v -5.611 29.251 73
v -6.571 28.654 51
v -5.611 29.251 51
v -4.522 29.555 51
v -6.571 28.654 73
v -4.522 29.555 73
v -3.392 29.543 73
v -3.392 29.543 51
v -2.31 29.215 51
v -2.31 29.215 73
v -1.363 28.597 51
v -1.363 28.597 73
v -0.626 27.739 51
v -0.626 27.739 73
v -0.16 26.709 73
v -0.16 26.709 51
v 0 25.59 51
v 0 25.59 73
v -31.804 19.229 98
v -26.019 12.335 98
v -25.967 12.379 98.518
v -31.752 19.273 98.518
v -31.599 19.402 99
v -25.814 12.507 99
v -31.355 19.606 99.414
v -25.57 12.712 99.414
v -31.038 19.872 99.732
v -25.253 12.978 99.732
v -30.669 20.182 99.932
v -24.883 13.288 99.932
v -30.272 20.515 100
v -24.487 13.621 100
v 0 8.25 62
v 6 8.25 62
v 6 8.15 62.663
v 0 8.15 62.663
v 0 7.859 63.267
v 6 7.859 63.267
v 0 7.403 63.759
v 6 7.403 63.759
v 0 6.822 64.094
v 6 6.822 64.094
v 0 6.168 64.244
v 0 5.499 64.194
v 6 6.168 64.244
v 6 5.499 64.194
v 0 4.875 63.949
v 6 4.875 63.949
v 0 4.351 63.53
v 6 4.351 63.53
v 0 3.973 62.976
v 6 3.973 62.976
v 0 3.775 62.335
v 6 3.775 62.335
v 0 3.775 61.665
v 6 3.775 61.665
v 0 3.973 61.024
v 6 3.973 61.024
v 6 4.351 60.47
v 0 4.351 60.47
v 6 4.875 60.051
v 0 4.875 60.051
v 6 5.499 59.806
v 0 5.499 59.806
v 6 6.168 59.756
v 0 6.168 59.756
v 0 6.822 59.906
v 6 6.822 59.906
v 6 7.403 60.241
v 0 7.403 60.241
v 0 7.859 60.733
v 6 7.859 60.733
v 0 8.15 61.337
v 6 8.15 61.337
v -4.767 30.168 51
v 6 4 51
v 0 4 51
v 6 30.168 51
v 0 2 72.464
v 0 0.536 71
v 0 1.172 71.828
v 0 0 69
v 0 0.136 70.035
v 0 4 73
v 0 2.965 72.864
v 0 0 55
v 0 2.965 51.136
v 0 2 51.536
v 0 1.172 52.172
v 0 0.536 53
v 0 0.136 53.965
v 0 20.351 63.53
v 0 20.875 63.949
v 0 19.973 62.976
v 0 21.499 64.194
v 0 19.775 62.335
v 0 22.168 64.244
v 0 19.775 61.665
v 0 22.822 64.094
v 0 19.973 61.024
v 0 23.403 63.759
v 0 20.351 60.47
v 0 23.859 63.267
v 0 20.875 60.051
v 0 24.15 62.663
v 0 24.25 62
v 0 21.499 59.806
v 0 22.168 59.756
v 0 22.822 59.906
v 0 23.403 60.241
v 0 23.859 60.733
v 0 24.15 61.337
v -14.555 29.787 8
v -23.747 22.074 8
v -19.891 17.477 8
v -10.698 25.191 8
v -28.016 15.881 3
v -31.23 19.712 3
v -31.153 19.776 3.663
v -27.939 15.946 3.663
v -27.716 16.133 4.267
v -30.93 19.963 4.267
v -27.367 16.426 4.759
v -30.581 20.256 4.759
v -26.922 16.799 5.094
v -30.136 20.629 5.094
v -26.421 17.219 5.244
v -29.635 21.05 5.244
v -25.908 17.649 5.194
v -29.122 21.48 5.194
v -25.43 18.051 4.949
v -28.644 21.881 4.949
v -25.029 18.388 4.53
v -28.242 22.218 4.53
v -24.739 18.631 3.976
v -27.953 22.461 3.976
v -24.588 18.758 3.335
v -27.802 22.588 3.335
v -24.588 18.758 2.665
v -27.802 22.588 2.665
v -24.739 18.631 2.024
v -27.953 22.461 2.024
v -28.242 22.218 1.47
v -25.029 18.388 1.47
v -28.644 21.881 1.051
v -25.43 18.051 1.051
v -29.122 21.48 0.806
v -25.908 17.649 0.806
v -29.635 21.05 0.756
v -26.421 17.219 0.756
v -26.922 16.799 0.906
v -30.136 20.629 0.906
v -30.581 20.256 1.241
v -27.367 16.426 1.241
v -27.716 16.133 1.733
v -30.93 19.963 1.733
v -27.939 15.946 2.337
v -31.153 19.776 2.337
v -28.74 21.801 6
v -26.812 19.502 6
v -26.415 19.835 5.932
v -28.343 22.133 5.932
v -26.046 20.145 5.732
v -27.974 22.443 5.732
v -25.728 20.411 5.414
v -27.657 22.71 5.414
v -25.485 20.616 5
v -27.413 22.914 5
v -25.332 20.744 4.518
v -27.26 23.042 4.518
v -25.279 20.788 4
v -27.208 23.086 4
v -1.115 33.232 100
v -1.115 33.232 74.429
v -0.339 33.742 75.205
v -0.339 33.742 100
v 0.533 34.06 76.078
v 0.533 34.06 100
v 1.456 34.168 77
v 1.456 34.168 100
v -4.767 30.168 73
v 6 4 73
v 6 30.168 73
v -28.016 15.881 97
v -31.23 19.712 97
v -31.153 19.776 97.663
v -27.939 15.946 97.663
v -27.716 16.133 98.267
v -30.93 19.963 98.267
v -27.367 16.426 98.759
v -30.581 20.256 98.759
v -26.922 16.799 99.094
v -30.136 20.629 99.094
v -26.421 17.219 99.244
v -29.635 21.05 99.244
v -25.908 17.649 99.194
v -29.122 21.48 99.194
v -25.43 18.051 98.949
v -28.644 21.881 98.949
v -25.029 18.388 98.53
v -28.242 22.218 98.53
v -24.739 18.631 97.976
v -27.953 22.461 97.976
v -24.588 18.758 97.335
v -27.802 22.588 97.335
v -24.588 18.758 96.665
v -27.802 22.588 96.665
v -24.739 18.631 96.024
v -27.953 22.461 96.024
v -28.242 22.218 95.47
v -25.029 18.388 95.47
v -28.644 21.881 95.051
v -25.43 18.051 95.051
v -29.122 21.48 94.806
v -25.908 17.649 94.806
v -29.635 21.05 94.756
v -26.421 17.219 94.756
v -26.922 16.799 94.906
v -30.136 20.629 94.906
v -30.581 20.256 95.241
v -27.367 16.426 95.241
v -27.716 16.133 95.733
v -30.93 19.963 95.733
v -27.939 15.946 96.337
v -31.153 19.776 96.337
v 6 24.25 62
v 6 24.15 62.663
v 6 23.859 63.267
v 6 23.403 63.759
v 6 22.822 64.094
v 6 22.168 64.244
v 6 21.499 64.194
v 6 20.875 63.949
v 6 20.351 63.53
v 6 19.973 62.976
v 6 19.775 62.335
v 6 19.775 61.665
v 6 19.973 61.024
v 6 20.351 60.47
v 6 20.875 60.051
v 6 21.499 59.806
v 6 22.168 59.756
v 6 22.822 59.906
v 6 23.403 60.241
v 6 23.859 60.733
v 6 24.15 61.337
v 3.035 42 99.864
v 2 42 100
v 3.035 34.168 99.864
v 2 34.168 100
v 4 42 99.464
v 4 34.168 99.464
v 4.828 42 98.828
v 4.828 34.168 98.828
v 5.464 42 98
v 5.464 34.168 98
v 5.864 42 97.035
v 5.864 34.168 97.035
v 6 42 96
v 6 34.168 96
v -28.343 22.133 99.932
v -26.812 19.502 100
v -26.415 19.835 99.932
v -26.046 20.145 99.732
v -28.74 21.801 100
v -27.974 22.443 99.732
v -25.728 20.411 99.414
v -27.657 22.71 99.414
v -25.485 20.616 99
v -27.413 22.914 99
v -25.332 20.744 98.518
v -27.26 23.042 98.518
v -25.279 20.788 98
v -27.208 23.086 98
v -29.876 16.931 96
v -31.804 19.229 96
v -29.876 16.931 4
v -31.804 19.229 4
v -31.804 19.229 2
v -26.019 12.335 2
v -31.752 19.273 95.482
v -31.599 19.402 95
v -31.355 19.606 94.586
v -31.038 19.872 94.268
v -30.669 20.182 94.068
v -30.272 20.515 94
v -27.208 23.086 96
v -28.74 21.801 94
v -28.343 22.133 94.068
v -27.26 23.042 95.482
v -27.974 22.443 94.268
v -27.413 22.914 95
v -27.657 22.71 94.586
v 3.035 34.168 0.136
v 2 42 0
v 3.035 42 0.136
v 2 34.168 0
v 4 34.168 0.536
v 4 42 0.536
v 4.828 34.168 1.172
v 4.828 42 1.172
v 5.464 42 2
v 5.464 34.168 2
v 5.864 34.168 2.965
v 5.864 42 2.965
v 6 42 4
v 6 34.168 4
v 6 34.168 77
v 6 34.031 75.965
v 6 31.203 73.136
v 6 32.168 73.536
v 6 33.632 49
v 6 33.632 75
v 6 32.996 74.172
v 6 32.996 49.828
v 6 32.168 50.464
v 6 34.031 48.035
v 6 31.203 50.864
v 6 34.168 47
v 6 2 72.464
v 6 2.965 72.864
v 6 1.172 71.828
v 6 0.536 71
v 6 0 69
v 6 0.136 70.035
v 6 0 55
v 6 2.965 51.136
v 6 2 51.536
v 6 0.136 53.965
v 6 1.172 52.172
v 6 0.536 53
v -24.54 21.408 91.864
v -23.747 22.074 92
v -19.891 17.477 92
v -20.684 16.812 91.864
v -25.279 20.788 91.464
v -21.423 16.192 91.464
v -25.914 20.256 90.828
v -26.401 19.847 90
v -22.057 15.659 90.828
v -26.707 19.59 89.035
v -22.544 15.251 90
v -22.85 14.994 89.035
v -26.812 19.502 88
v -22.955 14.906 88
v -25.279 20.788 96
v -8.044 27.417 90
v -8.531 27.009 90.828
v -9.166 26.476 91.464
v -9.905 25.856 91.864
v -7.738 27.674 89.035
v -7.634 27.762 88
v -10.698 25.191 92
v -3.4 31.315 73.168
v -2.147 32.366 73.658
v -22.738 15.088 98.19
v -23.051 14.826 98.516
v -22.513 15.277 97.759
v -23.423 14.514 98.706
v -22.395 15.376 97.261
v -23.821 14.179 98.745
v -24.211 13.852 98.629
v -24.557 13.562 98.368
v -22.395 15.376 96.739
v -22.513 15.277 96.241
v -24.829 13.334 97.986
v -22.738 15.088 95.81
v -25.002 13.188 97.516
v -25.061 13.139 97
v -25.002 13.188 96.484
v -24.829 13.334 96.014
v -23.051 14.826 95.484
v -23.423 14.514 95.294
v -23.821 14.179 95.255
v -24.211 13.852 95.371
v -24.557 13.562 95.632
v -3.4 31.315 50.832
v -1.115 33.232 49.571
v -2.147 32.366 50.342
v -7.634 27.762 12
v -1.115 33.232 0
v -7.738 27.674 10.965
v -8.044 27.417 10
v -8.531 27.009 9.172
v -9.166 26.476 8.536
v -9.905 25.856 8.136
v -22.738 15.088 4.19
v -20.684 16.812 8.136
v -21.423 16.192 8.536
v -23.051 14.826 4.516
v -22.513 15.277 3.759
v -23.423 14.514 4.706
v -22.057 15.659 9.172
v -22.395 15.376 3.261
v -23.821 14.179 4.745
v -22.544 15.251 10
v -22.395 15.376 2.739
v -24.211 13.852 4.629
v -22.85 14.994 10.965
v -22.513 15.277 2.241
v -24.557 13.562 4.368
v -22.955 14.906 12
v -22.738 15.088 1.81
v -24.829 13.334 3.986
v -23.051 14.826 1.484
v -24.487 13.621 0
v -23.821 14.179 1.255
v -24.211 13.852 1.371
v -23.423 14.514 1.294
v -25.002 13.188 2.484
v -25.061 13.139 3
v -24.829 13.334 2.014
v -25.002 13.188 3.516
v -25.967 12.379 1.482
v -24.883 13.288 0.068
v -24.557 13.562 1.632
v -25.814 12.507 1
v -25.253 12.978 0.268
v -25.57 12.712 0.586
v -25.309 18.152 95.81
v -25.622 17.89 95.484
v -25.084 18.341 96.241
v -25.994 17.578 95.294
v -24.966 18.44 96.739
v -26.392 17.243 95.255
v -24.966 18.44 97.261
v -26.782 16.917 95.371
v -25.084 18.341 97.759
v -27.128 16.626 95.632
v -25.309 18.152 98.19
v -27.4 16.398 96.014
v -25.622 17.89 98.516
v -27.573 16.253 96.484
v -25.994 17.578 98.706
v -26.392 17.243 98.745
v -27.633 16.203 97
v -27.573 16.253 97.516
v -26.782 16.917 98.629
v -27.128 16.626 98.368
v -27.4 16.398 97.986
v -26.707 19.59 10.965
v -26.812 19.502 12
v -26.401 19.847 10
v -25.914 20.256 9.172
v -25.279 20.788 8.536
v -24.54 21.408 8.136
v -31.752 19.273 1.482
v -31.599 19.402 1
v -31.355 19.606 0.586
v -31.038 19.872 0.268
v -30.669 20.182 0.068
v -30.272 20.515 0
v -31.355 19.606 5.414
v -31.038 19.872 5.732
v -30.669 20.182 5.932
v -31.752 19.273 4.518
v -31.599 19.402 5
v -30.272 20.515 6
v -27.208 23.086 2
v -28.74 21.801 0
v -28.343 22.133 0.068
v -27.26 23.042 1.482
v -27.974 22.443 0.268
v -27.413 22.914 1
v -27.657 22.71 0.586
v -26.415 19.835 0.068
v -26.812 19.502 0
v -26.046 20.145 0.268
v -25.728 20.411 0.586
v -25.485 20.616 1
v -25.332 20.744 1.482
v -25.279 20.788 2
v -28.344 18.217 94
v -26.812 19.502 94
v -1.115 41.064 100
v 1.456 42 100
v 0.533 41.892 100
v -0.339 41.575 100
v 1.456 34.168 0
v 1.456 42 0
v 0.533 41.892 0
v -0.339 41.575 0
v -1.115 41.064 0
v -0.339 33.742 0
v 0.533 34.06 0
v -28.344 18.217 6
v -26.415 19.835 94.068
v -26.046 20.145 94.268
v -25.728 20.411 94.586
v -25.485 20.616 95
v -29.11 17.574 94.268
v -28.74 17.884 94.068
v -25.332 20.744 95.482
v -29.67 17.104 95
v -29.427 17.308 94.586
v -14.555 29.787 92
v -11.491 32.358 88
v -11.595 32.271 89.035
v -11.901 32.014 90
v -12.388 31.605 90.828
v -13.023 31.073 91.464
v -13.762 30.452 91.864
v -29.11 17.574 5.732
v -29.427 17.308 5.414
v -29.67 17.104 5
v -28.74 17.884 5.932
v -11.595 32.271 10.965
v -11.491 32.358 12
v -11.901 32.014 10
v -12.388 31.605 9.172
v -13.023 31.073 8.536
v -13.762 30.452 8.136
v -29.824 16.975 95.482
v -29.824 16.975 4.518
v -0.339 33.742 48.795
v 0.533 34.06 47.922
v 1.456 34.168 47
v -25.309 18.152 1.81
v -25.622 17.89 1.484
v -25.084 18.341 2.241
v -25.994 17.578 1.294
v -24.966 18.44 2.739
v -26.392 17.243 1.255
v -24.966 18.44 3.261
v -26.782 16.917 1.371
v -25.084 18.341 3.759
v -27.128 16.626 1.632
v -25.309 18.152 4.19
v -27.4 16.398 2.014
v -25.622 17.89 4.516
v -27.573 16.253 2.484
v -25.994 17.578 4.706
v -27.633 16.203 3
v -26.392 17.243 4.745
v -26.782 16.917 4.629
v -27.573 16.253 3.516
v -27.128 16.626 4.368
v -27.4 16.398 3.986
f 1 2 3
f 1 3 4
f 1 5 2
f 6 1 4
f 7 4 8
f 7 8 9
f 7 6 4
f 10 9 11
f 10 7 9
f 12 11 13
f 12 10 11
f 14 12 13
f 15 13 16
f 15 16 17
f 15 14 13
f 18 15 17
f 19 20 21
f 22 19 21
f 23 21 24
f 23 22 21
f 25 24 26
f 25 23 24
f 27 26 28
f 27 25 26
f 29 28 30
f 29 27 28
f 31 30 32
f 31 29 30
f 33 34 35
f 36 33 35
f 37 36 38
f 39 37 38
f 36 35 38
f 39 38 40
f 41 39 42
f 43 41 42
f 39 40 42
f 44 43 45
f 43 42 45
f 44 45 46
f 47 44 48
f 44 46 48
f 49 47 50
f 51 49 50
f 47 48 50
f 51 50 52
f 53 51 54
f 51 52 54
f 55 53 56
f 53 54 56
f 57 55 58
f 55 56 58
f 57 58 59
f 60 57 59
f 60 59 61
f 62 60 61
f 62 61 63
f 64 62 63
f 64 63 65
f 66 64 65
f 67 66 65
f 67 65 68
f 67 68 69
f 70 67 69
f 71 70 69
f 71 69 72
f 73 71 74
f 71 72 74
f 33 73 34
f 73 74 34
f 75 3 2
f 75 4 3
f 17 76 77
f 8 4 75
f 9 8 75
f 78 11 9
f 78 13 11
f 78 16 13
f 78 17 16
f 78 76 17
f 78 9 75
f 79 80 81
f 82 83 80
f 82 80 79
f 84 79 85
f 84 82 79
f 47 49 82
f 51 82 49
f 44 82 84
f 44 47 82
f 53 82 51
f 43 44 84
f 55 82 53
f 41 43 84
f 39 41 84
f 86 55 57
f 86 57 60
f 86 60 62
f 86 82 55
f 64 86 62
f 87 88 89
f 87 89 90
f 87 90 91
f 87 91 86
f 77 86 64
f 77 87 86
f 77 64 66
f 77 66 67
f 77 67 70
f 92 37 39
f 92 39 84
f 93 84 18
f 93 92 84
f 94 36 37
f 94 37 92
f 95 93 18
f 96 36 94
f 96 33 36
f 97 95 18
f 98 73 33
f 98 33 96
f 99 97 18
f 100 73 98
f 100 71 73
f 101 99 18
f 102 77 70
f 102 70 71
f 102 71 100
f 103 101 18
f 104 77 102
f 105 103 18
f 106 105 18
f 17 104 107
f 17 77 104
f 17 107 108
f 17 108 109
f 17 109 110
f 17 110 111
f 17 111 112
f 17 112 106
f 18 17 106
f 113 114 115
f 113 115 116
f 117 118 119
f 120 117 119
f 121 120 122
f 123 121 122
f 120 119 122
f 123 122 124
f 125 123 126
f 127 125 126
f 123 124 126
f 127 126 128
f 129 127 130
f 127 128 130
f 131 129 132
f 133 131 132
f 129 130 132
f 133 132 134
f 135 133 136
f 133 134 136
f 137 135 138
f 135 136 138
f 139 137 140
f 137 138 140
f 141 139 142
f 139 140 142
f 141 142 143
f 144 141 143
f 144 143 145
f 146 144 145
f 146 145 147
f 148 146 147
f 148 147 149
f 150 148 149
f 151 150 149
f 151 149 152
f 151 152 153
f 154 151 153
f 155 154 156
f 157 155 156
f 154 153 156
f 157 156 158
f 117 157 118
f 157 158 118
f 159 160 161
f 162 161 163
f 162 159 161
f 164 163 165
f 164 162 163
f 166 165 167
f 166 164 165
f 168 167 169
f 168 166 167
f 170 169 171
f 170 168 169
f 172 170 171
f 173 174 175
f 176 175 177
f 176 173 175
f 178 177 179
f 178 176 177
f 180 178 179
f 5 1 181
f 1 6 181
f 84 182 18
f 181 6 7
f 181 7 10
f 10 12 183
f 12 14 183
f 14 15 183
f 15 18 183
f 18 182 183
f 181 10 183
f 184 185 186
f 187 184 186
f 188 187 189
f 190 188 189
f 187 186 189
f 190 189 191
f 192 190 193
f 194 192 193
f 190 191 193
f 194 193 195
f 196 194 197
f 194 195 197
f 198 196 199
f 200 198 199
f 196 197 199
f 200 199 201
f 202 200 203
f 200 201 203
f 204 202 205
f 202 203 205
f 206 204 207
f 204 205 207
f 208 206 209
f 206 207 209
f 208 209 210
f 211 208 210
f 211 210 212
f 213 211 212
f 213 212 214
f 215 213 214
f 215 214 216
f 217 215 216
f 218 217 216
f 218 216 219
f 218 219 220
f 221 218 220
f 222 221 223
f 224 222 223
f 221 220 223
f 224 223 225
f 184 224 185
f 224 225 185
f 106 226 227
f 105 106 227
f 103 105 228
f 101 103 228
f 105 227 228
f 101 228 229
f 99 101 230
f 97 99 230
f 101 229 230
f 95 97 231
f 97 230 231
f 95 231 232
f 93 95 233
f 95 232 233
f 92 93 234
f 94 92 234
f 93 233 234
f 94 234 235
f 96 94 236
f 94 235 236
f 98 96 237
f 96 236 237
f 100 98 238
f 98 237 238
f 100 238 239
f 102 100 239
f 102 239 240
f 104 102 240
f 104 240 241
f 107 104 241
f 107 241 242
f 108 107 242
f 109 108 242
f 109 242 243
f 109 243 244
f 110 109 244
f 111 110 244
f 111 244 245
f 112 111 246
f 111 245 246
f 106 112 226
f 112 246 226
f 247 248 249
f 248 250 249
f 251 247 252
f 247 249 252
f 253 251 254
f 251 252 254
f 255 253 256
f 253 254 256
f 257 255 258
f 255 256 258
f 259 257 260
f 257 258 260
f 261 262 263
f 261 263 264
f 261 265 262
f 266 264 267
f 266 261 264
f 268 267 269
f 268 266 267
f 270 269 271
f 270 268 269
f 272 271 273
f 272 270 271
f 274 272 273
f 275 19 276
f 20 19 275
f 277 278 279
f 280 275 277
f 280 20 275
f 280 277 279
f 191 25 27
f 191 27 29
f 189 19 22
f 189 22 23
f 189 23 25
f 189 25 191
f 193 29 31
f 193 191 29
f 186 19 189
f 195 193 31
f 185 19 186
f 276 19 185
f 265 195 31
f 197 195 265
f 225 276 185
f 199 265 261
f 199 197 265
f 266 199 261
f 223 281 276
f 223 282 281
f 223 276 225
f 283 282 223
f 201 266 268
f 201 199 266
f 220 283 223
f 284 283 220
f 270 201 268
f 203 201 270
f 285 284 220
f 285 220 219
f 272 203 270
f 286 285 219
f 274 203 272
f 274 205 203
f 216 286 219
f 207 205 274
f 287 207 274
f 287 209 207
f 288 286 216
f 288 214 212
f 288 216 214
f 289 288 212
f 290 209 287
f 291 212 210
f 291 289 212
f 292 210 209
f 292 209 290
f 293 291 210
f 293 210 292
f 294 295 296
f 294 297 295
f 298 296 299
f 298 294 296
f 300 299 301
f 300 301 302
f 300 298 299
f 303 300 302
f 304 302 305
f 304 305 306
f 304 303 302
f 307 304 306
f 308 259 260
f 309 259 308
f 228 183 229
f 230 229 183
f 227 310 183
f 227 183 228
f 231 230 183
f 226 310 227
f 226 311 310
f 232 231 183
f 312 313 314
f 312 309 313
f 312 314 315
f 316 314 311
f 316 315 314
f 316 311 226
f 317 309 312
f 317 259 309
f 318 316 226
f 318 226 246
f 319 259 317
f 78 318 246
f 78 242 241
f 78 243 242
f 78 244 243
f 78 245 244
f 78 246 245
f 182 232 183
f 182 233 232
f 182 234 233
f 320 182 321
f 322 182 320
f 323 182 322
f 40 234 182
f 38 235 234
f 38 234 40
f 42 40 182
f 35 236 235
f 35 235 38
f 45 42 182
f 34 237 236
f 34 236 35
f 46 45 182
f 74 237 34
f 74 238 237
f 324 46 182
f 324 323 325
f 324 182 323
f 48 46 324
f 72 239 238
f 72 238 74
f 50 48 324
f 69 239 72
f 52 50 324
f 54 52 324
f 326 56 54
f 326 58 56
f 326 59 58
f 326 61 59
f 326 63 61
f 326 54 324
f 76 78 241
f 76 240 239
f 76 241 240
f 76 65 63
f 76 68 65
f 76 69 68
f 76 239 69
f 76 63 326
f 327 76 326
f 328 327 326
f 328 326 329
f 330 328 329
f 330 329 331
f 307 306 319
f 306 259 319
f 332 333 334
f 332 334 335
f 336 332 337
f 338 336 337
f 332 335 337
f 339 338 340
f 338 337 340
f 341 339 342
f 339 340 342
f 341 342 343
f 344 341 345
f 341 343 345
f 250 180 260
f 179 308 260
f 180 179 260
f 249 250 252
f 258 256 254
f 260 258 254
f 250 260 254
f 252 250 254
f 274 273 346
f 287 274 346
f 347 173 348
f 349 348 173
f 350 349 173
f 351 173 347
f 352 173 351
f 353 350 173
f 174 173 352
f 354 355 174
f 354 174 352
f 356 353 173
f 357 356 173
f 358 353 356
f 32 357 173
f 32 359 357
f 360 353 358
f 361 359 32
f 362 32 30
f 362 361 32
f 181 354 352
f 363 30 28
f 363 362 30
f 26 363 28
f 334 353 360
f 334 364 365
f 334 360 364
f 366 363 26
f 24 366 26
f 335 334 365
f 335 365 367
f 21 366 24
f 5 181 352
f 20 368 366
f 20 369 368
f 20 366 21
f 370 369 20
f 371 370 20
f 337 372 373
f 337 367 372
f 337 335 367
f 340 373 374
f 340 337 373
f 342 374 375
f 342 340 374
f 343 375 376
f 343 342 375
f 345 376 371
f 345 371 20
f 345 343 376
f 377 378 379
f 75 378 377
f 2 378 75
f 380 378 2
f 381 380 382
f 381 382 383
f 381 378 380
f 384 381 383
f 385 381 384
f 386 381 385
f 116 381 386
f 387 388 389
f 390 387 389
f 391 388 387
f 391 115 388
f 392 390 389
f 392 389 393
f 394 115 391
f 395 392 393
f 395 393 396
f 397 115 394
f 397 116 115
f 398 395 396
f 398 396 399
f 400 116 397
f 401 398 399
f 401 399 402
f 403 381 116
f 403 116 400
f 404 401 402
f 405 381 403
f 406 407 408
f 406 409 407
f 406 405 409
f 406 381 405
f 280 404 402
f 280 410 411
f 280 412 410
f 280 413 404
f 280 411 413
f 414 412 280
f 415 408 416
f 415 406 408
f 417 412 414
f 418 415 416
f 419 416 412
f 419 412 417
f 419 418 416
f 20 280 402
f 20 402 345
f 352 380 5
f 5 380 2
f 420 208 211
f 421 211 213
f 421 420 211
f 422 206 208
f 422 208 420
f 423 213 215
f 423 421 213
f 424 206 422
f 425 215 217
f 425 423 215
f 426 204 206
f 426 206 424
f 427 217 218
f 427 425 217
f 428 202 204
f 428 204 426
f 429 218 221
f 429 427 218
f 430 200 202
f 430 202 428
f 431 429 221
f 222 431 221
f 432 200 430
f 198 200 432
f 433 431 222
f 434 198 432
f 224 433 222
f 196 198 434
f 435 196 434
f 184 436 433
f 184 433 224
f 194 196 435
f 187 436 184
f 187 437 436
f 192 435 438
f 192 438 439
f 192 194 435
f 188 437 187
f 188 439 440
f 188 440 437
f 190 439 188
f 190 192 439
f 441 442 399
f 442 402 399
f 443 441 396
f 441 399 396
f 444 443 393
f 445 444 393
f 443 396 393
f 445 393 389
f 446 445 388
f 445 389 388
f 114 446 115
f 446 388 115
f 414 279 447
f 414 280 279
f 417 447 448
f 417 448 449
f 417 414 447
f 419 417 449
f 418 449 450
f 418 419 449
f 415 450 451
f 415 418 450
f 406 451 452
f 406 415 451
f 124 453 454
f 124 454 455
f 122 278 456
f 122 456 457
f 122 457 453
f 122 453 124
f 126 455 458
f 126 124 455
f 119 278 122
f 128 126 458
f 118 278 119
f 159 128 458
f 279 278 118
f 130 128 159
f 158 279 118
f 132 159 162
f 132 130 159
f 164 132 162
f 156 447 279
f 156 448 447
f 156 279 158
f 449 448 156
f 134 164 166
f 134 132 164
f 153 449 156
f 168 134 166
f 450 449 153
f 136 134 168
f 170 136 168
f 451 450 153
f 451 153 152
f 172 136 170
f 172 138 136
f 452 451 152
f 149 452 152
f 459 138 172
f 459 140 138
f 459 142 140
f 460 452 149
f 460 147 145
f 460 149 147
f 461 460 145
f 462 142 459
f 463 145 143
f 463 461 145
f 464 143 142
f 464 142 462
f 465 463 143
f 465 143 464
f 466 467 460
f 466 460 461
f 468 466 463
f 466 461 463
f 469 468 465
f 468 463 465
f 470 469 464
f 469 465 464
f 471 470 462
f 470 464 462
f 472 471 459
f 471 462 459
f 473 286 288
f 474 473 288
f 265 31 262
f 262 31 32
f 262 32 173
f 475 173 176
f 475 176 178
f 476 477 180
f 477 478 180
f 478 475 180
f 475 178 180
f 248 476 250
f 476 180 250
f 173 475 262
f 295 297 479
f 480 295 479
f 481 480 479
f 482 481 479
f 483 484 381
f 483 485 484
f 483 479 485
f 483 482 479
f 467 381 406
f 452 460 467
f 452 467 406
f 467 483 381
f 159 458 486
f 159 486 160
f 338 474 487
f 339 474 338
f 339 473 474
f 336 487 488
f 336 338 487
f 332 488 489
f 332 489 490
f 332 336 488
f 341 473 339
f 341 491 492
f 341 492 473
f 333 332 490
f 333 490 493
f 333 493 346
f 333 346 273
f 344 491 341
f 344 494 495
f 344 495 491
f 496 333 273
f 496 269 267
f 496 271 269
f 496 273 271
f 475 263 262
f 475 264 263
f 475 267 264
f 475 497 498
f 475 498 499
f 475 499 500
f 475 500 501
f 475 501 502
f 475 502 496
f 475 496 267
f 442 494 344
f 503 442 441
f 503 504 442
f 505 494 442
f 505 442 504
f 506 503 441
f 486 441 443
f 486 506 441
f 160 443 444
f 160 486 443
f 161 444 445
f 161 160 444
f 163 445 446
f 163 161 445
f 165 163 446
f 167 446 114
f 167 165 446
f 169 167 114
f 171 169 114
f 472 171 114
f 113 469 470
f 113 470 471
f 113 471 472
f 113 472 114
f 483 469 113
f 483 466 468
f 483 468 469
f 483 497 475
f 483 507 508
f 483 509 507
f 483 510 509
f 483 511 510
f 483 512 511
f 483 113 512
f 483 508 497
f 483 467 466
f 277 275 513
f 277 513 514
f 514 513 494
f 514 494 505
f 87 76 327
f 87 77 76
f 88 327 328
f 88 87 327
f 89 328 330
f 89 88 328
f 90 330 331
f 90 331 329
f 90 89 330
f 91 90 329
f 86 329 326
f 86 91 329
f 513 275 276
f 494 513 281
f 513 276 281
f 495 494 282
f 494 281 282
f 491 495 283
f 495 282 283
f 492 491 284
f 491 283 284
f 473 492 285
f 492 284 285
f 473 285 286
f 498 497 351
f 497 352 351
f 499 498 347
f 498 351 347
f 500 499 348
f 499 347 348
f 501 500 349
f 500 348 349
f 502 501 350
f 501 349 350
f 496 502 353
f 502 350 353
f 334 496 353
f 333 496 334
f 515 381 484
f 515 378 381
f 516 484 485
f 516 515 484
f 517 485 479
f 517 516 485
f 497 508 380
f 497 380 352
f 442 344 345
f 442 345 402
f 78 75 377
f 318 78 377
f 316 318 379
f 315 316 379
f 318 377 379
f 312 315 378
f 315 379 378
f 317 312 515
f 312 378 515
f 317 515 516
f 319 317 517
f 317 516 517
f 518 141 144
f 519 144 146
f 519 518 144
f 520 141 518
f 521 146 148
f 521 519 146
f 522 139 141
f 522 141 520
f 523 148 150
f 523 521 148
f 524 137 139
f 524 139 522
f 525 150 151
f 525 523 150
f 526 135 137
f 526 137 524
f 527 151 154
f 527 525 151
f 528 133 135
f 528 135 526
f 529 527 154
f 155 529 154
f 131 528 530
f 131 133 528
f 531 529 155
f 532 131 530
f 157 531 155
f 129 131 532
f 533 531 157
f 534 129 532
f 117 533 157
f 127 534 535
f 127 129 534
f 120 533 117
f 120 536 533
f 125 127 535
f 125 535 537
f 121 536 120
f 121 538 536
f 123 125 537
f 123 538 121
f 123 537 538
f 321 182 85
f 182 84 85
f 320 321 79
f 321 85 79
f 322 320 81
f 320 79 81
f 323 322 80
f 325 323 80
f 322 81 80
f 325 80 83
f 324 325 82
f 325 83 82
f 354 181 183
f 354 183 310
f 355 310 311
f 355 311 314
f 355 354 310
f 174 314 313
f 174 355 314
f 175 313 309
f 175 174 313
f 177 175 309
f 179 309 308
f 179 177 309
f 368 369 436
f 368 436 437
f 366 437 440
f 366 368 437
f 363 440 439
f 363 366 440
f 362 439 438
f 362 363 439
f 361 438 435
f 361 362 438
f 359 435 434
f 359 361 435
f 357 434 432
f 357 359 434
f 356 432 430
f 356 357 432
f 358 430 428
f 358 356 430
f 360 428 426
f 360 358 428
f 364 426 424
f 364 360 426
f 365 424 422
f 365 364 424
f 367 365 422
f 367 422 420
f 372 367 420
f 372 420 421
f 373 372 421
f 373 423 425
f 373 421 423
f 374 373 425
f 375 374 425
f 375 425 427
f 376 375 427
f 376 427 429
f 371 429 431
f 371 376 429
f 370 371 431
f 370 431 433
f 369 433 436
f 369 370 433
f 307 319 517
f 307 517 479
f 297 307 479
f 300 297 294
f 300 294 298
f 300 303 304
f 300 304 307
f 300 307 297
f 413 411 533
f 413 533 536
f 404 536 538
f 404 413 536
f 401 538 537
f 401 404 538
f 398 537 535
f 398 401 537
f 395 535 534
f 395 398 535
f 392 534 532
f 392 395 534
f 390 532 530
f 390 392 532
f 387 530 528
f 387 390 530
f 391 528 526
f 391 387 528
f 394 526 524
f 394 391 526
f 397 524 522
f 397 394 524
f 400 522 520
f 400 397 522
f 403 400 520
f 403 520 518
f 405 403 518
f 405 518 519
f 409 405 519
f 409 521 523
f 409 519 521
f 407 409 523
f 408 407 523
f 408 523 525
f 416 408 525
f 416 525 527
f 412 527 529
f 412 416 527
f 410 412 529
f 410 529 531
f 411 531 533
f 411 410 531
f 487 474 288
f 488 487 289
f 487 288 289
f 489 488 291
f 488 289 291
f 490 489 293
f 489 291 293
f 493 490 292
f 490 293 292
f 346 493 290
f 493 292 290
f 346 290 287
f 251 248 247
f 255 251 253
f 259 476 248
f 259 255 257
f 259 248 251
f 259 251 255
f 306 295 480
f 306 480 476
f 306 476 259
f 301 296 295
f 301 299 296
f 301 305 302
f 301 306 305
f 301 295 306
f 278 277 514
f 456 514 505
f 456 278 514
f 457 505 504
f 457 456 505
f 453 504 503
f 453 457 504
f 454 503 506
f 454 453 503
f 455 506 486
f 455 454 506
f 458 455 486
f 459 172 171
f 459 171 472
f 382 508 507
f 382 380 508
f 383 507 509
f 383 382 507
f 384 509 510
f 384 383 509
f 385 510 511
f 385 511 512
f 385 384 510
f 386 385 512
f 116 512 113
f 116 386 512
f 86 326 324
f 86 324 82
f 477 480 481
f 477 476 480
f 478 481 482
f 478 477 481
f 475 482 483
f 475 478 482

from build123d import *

# Parameters (mm, degrees)
BOSS_EXTRU_1_DEPTH           = 100
ESQUISSE2_W                  = 6
ESQUISSE2_H                  = 6.000000000000014
ESQUISSE2_H_2                = 6.000000000000005
BOSS_EXTRU_2_DEPTH           = 3
ESQUISSE3_R                  = 2.2500000000000027
ESQUISSE3_R_2                = 2.250000000000001
ENL_V_MAT_EXTRU_1_DEPTH      = 5
ENL_V_MAT_EXTRU_2_DEPTH      = 106.73176853427184
ENL_V_MAT_EXTRU_2_DEPTH_BACK = 106.73176853427184
ESQUISSE4_R                  = 1.7500000000000013
ESQUISSE4_R_2                = 1.75
CONG_1_R                     = 2
ENL_V_MAT_EXTRU_3_DEPTH      = 6
CONG_2_R                     = 4
ENL_V_MAT_EXTRU_5_DEPTH      = 6.000001
CONG_3_R                     = 4
ESQUISSE7_R                  = 2.2500000000000027
ESQUISSE7_R_2                = 2.250000000000002
ENL_V_MAT_EXTRU_6_DEPTH      = 6


with BuildPart() as part:
    # Esquisse1 → Boss.-Extru.1 (new body)
    with BuildSketch(Plane.XY):
        Polygon((0, 0), (0, 34.167556264006286), (-26.019007623520746, 12.33501656351095), (-29.875733281640006, 16.9312832222248), (0, 42), (5.999999999999995, 42), (6, 2.4e-16), align=None)
    extrude(amount=BOSS_EXTRU_1_DEPTH)

    # Esquisse2 → Boss.-Extru.2 (add)
    with BuildSketch(Plane(origin=(-20.680962813256418, 24.64661173100532, 0), x_dir=(0.7660444431189743, 0.6427876096865438, 0), z_dir=(-0.6427876096865438, 0.7660444431189745, 0))):
        with Locations((-9.002920393165164, -97)):
            Rectangle(ESQUISSE2_W, ESQUISSE2_H)
        with Locations((-9.002920393165164, -3.0000000000000027)):
            Rectangle(ESQUISSE2_W, ESQUISSE2_H_2)
    extrude(amount=BOSS_EXTRU_2_DEPTH)

    # Esquisse3 → Enlèv. mat.-Extru.1 (cut)
    with BuildSketch(Plane(origin=(-22.609325642316065, 26.94474506036225, 0), x_dir=(0.7660444431189746, 0.6427876096865436, 0), z_dir=(-0.6427876096865435, 0.7660444431189745, 0))):
        with Locations(Location((-9.002920393165152, -97, 0), (0, 0, 180))):
            Circle(ESQUISSE3_R)
        with Locations(Location((-9.002920393165152, -3.0000000000000027, 0), (0, 0, 180))):
            Circle(ESQUISSE3_R_2)
    extrude(amount=-ENL_V_MAT_EXTRU_1_DEPTH, mode=Mode.SUBTRACT)

    # Esquisse4 → Enlèv. mat.-Extru.2 (cut, two sides: drawn at the far end of the back side and taken through both)
    with BuildSketch(Plane(origin=(-19.395387593883342, 23.114522844767386, 0), x_dir=(0.7660444431189743, 0.6427876096865437, 0), z_dir=(-0.6427876096865437, 0.7660444431189743, 0)).offset(-ENL_V_MAT_EXTRU_2_DEPTH_BACK)):
        with Locations(Location((-9.002920393165155, -97, 0), (0, 0, 180))):
            Circle(ESQUISSE4_R)
        with Locations(Location((-9.002920393165155, -3.0000000000000027, 0), (0, 0, 180))):
            Circle(ESQUISSE4_R_2)
    extrude(amount=ENL_V_MAT_EXTRU_2_DEPTH + ENL_V_MAT_EXTRU_2_DEPTH_BACK, mode=Mode.SUBTRACT)

    # Congé1
    cong_1_edges = [part.edges().sort_by_distance(p)[0] for p in [
        (-28.91155186711019, 15.782216557546342, 100),
        (-30.83991469616982, 18.080349886903274, 94),
        (-26.243648037455976, 21.937075545022537, 100),
        (-26.243648037455976, 21.937075545022537, 94),
        (-26.243648037455976, 21.937075545022537, 0),
        (-30.83991469616982, 18.080349886903274, 6.000000000000005),
        (-26.243648037455976, 21.937075545022537, 6.000000000000005),
        (-28.91155186711019, 15.782216557546342, 0),
    ]]
    fillet(cong_1_edges, radius=CONG_1_R)

    # Esquisse5 → Enlèv. mat.-Extru.3 (cut)
    with BuildSketch(Plane(origin=(6, 7.4e-16, 0), x_dir=(0, 0, -1), z_dir=(1, 1.2e-16, 0))):
        Polygon((-100, -4.5e-16), (-73.00000000000001, 0), (-73.00000000000001, 34.167556264006286), (-100, 34.167556264006286), align=None)
        Polygon((0, 0), (-51, -6.25e-15), (-51, 34.167556264006286), (0, 34.167556264006286), align=None)
    extrude(amount=-ENL_V_MAT_EXTRU_3_DEPTH, mode=Mode.SUBTRACT)

    # Congé2
    cong_2_edges = [part.edges().sort_by_distance(p)[0] for p in [
        (0, 34.167556264006286, 62.00000000000001),
    ]]
    fillet(cong_2_edges, radius=CONG_2_R)

    # Esquisse6 → Enlèv. mat.-Extru.5 (cut)
    with BuildSketch(Plane(origin=(-20.68096281325642, 24.646611731005315, 0), x_dir=(0.7660444431189746, 0.6427876096865437, 0), z_dir=(-0.6427876096865437, 0.7660444431189746, 0))):
        Polygon((-8.002920393165189, -8.000000000000007), (11.997079606834813, -8.000000000000007), (11.997079606834824, -92), (-8.002920393165178, -92), align=None)
    extrude(amount=-ENL_V_MAT_EXTRU_5_DEPTH, mode=Mode.SUBTRACT)

    # Congé3
    cong_3_edges = [part.edges().sort_by_distance(p)[0] for p in [
        (0, 34.167556264006286, 86.5),
        (0, 42, 50),
        (5.999999999999996, 38.08377813200315, 100),
        (2.9999999999999964, 34.167556264006286, 73.00000000000001),
        (3, 4e-16, 73.00000000000001),
        (5.999999999999996, 38.08377813200315, 0),
        (3, -5.85e-15, 51),
        (0, 34.167556264006286, 25.5),
        (2.9999999999999964, 34.167556264006286, 51),
        (-24.88319268010449, 17.204300331614043, 92),
        (-24.8831926801045, 17.20430033161404, 8.000000000000007),
        (-9.562303817725006, 30.060052525344915, 8.000000000000007),
        (-9.562303817724995, 30.060052525344922, 92),
    ]]
    fillet(cong_3_edges, radius=CONG_3_R)

    # Esquisse7 → Enlèv. mat.-Extru.6 (cut)
    with BuildSketch(Plane(origin=(6, 7.4e-16, 0), x_dir=(0, 0, -1), z_dir=(1, 1.3e-16, 0))):
        with Locations(Location((-62, 22, 0), (0, 0, 90))):
            Circle(ESQUISSE7_R)
        with Locations(Location((-62, 6, 0), (0, 0, 90))):
            Circle(ESQUISSE7_R_2)
    extrude(amount=-ENL_V_MAT_EXTRU_6_DEPTH, mode=Mode.SUBTRACT)


solid = part.part
